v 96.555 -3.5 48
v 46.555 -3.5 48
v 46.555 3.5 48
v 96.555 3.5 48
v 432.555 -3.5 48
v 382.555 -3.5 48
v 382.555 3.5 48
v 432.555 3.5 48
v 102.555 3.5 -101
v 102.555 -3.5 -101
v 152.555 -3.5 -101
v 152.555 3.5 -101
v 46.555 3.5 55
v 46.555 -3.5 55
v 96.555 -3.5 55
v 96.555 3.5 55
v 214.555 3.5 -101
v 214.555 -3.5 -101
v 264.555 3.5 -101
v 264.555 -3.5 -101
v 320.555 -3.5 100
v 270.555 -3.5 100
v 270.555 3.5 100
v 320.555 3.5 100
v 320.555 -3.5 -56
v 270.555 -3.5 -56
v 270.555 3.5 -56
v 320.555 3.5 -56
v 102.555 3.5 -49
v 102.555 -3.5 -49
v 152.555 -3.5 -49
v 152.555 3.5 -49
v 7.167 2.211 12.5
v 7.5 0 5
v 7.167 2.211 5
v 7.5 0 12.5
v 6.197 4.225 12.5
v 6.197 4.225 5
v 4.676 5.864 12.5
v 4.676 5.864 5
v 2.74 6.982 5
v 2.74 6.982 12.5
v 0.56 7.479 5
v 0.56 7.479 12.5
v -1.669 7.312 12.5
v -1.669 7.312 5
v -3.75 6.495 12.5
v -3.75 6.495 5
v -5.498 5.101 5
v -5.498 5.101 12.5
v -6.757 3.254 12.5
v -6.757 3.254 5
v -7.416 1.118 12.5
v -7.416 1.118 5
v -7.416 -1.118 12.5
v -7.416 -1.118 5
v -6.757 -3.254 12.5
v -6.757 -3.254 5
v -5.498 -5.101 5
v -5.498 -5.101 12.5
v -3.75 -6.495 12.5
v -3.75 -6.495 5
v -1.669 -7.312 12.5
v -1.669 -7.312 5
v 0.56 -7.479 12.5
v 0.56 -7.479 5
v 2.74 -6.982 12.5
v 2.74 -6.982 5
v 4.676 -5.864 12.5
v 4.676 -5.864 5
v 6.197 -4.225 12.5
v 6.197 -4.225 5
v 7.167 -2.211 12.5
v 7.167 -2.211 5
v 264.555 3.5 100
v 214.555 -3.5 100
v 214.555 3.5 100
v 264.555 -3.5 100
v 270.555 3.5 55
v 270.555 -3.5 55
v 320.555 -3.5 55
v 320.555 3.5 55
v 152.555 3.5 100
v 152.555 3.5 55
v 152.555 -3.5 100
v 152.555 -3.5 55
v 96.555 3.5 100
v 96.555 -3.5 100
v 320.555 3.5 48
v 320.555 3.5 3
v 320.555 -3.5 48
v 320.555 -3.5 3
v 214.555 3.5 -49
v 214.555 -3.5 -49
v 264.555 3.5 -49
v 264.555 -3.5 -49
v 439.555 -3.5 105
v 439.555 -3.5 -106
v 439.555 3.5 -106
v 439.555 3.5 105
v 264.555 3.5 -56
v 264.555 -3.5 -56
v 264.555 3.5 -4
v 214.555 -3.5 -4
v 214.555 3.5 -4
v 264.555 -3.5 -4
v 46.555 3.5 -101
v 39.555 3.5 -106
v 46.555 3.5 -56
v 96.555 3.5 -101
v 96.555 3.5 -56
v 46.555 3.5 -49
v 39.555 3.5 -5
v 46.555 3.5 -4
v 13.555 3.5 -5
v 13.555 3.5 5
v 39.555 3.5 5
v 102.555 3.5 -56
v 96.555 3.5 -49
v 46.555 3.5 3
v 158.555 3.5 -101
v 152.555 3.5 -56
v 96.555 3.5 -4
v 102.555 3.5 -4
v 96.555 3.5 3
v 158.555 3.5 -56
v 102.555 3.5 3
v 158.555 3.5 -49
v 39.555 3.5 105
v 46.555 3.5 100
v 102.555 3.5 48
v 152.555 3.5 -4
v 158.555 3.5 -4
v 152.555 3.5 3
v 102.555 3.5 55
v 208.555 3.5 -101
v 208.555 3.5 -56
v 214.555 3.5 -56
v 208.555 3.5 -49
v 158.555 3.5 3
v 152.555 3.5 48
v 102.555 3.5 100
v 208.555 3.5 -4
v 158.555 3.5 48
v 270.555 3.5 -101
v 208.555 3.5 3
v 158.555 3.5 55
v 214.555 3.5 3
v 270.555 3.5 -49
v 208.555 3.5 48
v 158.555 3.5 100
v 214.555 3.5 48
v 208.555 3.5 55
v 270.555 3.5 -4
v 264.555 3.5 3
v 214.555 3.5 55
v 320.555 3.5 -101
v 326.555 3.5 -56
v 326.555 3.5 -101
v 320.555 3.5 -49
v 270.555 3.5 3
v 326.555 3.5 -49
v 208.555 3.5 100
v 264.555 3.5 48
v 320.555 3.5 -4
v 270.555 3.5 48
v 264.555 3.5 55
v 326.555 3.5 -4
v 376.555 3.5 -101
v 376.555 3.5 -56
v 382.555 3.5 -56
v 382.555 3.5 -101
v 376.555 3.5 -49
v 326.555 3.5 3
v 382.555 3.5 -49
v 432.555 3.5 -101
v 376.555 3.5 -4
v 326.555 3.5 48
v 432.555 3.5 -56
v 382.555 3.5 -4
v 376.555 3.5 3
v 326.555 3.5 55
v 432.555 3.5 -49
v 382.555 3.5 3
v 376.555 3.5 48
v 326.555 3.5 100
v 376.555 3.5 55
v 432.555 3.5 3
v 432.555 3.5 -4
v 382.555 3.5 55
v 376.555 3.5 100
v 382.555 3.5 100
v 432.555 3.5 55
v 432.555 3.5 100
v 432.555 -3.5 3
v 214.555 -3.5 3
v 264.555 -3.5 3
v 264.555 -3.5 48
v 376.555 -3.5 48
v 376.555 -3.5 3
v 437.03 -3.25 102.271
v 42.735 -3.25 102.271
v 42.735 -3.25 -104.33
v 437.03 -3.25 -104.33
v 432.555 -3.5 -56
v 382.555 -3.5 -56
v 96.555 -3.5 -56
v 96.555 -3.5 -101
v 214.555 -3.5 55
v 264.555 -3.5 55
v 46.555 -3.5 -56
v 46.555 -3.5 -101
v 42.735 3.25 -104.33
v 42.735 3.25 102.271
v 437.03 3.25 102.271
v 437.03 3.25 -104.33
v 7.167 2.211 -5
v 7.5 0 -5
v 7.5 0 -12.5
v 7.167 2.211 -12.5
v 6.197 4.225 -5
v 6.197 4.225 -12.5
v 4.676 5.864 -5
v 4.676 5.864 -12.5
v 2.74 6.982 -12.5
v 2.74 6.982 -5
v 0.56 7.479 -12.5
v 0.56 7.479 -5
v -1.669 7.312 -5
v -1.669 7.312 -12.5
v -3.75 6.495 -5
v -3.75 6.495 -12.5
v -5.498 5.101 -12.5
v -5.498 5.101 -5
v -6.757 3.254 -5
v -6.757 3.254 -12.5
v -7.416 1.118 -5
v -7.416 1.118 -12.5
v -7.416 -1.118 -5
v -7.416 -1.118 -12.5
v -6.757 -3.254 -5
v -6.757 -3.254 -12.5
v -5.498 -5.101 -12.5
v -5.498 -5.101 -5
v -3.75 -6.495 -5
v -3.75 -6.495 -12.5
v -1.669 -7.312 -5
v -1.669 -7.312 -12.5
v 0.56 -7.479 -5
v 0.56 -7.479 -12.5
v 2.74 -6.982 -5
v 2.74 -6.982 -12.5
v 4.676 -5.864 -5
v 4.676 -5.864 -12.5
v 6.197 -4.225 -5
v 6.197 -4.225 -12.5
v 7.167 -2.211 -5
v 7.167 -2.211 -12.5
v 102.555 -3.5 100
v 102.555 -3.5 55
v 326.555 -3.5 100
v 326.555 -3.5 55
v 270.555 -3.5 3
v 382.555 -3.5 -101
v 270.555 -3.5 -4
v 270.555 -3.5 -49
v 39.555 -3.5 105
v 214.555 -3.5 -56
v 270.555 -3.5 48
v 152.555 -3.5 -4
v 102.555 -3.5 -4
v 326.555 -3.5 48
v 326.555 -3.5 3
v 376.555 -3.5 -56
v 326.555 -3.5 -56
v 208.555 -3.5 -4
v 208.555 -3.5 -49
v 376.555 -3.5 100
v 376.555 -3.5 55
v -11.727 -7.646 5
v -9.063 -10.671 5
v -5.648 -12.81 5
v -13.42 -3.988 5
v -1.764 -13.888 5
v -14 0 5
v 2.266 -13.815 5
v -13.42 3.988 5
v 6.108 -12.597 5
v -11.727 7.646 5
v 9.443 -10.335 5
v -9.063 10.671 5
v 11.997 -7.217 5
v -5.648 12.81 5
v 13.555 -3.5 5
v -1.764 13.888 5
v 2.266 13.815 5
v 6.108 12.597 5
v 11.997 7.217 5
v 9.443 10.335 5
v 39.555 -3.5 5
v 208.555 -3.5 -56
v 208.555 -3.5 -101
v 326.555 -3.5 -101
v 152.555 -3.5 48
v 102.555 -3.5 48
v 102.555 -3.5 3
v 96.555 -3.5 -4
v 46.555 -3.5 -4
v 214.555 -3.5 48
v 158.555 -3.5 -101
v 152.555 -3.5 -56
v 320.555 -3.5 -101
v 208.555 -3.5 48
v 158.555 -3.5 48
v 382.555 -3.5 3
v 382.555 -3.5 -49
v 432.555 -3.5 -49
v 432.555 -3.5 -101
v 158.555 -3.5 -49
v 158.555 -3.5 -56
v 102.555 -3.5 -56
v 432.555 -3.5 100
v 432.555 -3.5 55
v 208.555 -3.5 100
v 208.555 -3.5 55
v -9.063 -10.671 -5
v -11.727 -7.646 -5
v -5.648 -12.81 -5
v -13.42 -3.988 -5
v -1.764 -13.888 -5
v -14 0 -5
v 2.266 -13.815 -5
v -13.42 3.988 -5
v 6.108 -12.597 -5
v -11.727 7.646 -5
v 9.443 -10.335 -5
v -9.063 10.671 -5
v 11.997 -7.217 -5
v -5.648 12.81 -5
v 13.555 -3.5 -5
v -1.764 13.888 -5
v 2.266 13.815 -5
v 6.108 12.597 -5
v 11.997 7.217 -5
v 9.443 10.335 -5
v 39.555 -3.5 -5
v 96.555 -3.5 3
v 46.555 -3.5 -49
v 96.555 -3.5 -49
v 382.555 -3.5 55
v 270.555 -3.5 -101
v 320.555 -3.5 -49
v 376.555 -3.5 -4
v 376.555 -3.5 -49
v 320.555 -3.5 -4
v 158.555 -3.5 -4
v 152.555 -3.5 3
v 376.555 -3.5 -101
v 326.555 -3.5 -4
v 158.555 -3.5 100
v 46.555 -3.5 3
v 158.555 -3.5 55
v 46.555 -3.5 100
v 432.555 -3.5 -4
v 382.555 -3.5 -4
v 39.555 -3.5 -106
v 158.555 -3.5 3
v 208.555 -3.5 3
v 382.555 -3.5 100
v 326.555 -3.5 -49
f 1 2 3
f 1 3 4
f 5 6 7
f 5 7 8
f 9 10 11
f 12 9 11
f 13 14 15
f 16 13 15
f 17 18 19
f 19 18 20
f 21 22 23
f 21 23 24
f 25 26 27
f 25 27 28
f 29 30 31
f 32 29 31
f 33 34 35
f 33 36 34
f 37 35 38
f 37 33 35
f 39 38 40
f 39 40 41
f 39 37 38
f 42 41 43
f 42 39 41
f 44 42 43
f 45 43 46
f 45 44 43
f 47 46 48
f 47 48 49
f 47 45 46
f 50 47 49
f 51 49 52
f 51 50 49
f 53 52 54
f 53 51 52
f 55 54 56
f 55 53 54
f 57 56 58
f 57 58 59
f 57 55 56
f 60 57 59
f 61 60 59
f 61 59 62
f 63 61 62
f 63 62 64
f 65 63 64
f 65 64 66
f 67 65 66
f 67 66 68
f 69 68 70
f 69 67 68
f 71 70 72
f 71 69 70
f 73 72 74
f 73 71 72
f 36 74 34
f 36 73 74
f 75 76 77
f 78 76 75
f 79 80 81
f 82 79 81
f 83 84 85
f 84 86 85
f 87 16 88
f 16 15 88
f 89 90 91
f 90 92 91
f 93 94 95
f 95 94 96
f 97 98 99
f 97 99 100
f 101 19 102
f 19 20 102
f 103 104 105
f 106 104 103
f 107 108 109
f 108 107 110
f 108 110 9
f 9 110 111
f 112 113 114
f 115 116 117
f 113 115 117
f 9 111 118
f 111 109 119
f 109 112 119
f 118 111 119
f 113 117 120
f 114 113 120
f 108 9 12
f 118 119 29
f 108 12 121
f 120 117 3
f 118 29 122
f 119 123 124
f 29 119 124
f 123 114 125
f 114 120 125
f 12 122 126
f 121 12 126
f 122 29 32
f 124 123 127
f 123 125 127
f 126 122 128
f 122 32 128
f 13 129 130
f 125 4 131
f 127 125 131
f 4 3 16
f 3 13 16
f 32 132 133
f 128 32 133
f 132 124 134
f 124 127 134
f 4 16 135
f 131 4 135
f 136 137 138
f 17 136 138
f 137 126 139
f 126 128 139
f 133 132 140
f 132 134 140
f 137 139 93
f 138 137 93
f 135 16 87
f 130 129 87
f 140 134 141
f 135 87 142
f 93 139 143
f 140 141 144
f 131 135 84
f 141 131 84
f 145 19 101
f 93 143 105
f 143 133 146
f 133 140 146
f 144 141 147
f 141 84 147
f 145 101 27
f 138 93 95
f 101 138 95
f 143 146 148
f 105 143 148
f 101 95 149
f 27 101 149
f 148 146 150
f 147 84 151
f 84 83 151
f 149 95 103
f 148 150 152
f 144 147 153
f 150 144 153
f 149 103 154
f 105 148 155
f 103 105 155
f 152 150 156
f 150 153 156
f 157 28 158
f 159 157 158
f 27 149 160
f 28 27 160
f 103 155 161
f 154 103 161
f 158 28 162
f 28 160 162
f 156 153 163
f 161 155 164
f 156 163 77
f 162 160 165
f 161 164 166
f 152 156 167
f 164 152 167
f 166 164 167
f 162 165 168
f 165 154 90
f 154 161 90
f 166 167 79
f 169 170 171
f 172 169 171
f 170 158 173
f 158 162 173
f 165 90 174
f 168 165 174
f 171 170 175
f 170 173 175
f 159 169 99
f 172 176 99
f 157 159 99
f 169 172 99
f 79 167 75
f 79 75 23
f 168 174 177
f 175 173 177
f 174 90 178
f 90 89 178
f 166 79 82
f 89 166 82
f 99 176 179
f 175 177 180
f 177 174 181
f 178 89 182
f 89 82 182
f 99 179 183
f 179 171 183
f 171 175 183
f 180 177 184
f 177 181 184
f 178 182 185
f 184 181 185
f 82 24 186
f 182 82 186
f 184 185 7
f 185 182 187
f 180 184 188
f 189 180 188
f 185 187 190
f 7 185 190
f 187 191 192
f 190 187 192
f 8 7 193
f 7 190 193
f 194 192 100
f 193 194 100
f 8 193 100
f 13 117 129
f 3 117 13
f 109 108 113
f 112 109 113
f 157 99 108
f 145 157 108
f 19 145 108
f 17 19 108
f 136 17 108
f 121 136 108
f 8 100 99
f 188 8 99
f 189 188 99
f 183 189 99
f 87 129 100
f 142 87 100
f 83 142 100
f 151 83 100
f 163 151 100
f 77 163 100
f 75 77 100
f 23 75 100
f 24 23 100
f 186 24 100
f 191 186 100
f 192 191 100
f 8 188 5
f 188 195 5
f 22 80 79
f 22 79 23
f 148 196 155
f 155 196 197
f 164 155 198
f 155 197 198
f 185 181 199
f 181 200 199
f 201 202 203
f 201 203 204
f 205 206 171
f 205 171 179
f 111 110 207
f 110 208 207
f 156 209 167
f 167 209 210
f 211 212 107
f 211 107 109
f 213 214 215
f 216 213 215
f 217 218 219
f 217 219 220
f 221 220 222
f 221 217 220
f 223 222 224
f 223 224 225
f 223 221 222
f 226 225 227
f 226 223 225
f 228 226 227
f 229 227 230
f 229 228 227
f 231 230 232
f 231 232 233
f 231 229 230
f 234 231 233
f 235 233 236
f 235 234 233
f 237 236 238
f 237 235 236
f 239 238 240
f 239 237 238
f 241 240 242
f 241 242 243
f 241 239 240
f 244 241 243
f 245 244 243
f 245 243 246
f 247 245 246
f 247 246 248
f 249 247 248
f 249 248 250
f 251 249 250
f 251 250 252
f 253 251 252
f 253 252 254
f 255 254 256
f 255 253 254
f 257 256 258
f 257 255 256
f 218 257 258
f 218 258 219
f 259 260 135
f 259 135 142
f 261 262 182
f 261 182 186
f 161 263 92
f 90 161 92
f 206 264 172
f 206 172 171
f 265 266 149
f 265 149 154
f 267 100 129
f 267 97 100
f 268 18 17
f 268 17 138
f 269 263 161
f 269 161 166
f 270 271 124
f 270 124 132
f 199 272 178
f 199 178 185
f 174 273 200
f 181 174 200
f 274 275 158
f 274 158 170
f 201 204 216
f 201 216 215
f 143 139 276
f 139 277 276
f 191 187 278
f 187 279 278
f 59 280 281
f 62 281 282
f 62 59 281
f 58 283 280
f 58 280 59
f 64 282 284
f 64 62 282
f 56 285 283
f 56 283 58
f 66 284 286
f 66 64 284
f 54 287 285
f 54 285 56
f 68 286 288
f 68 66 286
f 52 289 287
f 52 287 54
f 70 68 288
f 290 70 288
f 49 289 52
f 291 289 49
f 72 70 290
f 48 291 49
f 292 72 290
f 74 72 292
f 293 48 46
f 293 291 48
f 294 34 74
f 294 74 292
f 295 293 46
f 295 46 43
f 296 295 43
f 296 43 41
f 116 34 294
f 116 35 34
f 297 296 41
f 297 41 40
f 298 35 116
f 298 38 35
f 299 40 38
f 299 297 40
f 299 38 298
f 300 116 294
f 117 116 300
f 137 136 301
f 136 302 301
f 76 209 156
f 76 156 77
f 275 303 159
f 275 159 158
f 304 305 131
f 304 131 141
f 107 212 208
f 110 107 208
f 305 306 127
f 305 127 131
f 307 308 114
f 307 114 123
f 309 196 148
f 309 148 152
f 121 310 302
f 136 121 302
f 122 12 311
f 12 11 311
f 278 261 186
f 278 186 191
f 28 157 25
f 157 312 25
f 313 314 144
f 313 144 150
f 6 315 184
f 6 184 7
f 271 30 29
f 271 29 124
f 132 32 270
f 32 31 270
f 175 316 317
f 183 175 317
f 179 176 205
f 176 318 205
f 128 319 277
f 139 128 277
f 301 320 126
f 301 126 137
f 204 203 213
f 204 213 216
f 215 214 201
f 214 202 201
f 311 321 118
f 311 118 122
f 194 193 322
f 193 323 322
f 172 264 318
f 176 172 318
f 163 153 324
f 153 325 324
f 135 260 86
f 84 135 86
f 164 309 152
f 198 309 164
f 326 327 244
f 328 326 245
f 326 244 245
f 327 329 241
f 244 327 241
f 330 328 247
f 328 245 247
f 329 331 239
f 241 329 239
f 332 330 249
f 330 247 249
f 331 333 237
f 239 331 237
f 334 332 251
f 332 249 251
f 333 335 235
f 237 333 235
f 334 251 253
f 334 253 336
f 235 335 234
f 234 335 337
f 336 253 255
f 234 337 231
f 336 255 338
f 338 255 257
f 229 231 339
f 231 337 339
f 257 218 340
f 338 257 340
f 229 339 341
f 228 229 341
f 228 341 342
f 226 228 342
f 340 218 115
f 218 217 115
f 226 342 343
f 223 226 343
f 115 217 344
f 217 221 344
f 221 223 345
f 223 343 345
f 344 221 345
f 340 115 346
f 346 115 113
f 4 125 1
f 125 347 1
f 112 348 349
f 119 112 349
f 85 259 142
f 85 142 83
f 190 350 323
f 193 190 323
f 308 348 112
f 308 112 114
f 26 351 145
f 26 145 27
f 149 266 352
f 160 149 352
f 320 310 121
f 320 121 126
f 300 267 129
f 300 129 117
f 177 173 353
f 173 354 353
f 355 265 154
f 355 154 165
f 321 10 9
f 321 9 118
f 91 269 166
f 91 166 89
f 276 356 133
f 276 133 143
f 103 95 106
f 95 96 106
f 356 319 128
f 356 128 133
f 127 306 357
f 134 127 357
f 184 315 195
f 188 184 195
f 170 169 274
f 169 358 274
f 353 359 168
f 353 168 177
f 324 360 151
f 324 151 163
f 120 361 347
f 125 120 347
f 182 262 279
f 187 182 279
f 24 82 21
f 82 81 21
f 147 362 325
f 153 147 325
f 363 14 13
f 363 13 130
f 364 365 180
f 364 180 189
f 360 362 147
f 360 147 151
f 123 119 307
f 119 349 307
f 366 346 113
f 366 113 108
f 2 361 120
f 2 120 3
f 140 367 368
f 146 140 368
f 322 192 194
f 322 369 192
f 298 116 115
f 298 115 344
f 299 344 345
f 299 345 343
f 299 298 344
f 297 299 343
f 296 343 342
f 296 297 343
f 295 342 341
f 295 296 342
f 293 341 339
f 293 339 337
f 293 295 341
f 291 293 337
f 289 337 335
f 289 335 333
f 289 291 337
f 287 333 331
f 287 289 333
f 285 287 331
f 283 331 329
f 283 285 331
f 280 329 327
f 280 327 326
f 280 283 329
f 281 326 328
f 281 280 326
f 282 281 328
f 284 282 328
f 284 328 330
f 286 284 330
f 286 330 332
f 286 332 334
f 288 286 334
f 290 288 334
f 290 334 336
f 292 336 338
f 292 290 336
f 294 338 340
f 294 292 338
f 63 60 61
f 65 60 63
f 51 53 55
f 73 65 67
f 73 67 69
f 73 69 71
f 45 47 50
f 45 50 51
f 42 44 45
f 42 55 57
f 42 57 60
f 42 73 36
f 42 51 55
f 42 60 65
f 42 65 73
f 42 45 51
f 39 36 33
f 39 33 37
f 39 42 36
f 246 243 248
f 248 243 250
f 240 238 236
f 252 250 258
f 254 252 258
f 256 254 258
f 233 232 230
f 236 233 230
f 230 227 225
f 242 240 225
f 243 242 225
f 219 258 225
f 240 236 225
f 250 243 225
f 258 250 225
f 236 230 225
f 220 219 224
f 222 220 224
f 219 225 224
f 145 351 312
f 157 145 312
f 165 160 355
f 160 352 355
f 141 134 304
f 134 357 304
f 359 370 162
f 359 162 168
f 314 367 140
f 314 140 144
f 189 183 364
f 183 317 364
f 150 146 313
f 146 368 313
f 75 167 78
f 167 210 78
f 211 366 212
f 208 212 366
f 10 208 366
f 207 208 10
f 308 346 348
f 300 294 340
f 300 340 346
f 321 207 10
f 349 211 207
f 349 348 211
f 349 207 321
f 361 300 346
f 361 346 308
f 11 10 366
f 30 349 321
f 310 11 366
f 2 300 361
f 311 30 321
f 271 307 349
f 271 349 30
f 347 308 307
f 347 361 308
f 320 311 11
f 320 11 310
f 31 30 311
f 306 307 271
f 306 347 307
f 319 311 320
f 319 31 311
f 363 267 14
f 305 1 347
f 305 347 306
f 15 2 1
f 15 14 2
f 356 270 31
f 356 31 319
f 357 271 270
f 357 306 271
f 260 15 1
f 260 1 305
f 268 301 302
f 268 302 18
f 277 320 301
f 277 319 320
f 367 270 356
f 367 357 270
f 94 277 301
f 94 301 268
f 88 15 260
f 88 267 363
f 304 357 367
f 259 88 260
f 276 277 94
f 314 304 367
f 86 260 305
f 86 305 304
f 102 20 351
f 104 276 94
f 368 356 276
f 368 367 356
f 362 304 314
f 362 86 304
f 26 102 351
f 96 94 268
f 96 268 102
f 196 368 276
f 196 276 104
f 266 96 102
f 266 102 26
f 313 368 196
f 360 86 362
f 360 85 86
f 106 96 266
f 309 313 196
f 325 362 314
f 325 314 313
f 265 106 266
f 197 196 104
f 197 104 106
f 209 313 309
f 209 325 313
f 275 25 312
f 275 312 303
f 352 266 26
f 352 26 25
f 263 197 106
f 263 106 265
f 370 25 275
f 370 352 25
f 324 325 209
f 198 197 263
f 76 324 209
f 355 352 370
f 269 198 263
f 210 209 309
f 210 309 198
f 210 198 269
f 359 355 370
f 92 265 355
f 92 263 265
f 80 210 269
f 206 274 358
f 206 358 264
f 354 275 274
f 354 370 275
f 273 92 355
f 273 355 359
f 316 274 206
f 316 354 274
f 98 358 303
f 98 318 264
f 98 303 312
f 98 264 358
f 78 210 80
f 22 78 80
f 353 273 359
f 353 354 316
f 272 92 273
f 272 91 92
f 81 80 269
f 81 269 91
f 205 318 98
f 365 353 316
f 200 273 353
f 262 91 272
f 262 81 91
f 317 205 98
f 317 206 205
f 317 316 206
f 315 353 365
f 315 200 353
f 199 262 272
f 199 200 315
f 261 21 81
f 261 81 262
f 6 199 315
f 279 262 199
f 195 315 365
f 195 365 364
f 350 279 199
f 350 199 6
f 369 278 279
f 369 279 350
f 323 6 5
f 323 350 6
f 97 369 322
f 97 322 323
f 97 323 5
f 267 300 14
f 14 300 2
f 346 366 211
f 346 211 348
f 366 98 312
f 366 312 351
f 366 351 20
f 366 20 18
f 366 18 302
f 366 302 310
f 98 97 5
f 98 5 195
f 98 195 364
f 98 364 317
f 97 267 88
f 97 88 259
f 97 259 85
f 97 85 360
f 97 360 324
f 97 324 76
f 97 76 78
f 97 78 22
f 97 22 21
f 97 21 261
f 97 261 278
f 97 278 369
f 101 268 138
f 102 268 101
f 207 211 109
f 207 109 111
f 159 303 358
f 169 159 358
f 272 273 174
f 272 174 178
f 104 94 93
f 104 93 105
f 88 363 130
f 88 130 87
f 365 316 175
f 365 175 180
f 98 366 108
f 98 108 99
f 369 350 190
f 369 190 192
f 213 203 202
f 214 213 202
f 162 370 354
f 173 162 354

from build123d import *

# Parameters (mm, degrees)
F0_R     = 7.5
F1_DEPTH = 12.5
F3_DEPTH = 5
F4_W     = 50
F4_H     = 45
F5_DEPTH = 3.5
F6_W     = 394.294891
F6_H     = 206.600897
F7_DEPTH = 3.25


with BuildPart() as f1:
    # F0 (on Top) → F1 (new body, symmetric)
    with BuildSketch(Plane.XY):
        Circle(F0_R)
    extrude(amount=F1_DEPTH, both=True)

    # F2 (on Top) → F3 (join, symmetric)
    with BuildSketch(Plane.XY):
        with BuildLine():
            Line((39.555442, 3.5), (13.555442, 3.5))
            ThreePointArc((13.555442, 3.5), (-14, 0), (13.555442, -3.5))
            Line((13.555442, -3.5), (39.555442, -3.5))
            Line((39.555442, -3.5), (39.555442, 3.5))
        make_face()
    extrude(amount=F3_DEPTH, both=True)

    # F4 (on Front) → F5 (join, symmetric)
    with BuildSketch(Plane.XZ):
        Polygon((39.555442, 105), (39.555442, 5), (39.555442, -5), (39.555442, -106), (439.555442, -106), (439.555442, 105), align=None)
        with Locations((71.555442, -78.5)):
            Rectangle(F4_W, F4_H, mode=Mode.SUBTRACT)
        with Locations((127.555442, -78.5)):
            Rectangle(F4_W, F4_H, mode=Mode.SUBTRACT)
        with Locations((183.555442, -78.5)):
            Rectangle(F4_W, F4_H, mode=Mode.SUBTRACT)
        with Locations((239.555442, -78.5)):
            Rectangle(F4_W, F4_H, mode=Mode.SUBTRACT)
        with Locations((71.555442, -26.5)):
            Rectangle(F4_W, F4_H, mode=Mode.SUBTRACT)
        with Locations((127.555442, -26.5)):
            Rectangle(F4_W, F4_H, mode=Mode.SUBTRACT)
        with Locations((183.555442, -26.5)):
            Rectangle(F4_W, F4_H, mode=Mode.SUBTRACT)
        with Locations((239.555442, -26.5)):
            Rectangle(F4_W, F4_H, mode=Mode.SUBTRACT)
        with Locations((295.555442, -78.5)):
            Rectangle(F4_W, F4_H, mode=Mode.SUBTRACT)
        with Locations((351.555442, -78.5)):
            Rectangle(F4_W, F4_H, mode=Mode.SUBTRACT)
        with Locations((407.555442, -78.5)):
            Rectangle(F4_W, F4_H, mode=Mode.SUBTRACT)
        with Locations((295.555442, -26.5)):
            Rectangle(F4_W, F4_H, mode=Mode.SUBTRACT)
        with Locations((351.555442, -26.5)):
            Rectangle(F4_W, F4_H, mode=Mode.SUBTRACT)
        with Locations((407.555442, -26.5)):
            Rectangle(F4_W, F4_H, mode=Mode.SUBTRACT)
        with Locations((71.555442, 25.5)):
            Rectangle(F4_W, F4_H, mode=Mode.SUBTRACT)
        with Locations((127.555442, 25.5)):
            Rectangle(F4_W, F4_H, mode=Mode.SUBTRACT)
        with Locations((183.555442, 25.5)):
            Rectangle(F4_W, F4_H, mode=Mode.SUBTRACT)
        with Locations((239.555442, 25.5)):
            Rectangle(F4_W, F4_H, mode=Mode.SUBTRACT)
        with Locations((71.555442, 77.5)):
            Rectangle(F4_W, F4_H, mode=Mode.SUBTRACT)
        with Locations((127.555442, 77.5)):
            Rectangle(F4_W, F4_H, mode=Mode.SUBTRACT)
        with Locations((183.555442, 77.5)):
            Rectangle(F4_W, F4_H, mode=Mode.SUBTRACT)
        with Locations((239.555442, 77.5)):
            Rectangle(F4_W, F4_H, mode=Mode.SUBTRACT)
        with Locations((295.555442, 25.5)):
            Rectangle(F4_W, F4_H, mode=Mode.SUBTRACT)
        with Locations((351.555442, 25.5)):
            Rectangle(F4_W, F4_H, mode=Mode.SUBTRACT)
        with Locations((407.555442, 25.5)):
            Rectangle(F4_W, F4_H, mode=Mode.SUBTRACT)
        with Locations((295.555442, 77.5)):
            Rectangle(F4_W, F4_H, mode=Mode.SUBTRACT)
        with Locations((351.555442, 77.5)):
            Rectangle(F4_W, F4_H, mode=Mode.SUBTRACT)
        with Locations((407.555442, 77.5)):
            Rectangle(F4_W, F4_H, mode=Mode.SUBTRACT)
    extrude(amount=F5_DEPTH, both=True)


with BuildPart() as f7:
    # F6 (on Front) → F7 (new body, symmetric)
    with BuildSketch(Plane.XZ):
        with Locations((239.882452, -1.029384)):
            Rectangle(F6_W, F6_H)
    extrude(amount=F7_DEPTH, both=True)


solid = Compound([f1.part, f7.part])
